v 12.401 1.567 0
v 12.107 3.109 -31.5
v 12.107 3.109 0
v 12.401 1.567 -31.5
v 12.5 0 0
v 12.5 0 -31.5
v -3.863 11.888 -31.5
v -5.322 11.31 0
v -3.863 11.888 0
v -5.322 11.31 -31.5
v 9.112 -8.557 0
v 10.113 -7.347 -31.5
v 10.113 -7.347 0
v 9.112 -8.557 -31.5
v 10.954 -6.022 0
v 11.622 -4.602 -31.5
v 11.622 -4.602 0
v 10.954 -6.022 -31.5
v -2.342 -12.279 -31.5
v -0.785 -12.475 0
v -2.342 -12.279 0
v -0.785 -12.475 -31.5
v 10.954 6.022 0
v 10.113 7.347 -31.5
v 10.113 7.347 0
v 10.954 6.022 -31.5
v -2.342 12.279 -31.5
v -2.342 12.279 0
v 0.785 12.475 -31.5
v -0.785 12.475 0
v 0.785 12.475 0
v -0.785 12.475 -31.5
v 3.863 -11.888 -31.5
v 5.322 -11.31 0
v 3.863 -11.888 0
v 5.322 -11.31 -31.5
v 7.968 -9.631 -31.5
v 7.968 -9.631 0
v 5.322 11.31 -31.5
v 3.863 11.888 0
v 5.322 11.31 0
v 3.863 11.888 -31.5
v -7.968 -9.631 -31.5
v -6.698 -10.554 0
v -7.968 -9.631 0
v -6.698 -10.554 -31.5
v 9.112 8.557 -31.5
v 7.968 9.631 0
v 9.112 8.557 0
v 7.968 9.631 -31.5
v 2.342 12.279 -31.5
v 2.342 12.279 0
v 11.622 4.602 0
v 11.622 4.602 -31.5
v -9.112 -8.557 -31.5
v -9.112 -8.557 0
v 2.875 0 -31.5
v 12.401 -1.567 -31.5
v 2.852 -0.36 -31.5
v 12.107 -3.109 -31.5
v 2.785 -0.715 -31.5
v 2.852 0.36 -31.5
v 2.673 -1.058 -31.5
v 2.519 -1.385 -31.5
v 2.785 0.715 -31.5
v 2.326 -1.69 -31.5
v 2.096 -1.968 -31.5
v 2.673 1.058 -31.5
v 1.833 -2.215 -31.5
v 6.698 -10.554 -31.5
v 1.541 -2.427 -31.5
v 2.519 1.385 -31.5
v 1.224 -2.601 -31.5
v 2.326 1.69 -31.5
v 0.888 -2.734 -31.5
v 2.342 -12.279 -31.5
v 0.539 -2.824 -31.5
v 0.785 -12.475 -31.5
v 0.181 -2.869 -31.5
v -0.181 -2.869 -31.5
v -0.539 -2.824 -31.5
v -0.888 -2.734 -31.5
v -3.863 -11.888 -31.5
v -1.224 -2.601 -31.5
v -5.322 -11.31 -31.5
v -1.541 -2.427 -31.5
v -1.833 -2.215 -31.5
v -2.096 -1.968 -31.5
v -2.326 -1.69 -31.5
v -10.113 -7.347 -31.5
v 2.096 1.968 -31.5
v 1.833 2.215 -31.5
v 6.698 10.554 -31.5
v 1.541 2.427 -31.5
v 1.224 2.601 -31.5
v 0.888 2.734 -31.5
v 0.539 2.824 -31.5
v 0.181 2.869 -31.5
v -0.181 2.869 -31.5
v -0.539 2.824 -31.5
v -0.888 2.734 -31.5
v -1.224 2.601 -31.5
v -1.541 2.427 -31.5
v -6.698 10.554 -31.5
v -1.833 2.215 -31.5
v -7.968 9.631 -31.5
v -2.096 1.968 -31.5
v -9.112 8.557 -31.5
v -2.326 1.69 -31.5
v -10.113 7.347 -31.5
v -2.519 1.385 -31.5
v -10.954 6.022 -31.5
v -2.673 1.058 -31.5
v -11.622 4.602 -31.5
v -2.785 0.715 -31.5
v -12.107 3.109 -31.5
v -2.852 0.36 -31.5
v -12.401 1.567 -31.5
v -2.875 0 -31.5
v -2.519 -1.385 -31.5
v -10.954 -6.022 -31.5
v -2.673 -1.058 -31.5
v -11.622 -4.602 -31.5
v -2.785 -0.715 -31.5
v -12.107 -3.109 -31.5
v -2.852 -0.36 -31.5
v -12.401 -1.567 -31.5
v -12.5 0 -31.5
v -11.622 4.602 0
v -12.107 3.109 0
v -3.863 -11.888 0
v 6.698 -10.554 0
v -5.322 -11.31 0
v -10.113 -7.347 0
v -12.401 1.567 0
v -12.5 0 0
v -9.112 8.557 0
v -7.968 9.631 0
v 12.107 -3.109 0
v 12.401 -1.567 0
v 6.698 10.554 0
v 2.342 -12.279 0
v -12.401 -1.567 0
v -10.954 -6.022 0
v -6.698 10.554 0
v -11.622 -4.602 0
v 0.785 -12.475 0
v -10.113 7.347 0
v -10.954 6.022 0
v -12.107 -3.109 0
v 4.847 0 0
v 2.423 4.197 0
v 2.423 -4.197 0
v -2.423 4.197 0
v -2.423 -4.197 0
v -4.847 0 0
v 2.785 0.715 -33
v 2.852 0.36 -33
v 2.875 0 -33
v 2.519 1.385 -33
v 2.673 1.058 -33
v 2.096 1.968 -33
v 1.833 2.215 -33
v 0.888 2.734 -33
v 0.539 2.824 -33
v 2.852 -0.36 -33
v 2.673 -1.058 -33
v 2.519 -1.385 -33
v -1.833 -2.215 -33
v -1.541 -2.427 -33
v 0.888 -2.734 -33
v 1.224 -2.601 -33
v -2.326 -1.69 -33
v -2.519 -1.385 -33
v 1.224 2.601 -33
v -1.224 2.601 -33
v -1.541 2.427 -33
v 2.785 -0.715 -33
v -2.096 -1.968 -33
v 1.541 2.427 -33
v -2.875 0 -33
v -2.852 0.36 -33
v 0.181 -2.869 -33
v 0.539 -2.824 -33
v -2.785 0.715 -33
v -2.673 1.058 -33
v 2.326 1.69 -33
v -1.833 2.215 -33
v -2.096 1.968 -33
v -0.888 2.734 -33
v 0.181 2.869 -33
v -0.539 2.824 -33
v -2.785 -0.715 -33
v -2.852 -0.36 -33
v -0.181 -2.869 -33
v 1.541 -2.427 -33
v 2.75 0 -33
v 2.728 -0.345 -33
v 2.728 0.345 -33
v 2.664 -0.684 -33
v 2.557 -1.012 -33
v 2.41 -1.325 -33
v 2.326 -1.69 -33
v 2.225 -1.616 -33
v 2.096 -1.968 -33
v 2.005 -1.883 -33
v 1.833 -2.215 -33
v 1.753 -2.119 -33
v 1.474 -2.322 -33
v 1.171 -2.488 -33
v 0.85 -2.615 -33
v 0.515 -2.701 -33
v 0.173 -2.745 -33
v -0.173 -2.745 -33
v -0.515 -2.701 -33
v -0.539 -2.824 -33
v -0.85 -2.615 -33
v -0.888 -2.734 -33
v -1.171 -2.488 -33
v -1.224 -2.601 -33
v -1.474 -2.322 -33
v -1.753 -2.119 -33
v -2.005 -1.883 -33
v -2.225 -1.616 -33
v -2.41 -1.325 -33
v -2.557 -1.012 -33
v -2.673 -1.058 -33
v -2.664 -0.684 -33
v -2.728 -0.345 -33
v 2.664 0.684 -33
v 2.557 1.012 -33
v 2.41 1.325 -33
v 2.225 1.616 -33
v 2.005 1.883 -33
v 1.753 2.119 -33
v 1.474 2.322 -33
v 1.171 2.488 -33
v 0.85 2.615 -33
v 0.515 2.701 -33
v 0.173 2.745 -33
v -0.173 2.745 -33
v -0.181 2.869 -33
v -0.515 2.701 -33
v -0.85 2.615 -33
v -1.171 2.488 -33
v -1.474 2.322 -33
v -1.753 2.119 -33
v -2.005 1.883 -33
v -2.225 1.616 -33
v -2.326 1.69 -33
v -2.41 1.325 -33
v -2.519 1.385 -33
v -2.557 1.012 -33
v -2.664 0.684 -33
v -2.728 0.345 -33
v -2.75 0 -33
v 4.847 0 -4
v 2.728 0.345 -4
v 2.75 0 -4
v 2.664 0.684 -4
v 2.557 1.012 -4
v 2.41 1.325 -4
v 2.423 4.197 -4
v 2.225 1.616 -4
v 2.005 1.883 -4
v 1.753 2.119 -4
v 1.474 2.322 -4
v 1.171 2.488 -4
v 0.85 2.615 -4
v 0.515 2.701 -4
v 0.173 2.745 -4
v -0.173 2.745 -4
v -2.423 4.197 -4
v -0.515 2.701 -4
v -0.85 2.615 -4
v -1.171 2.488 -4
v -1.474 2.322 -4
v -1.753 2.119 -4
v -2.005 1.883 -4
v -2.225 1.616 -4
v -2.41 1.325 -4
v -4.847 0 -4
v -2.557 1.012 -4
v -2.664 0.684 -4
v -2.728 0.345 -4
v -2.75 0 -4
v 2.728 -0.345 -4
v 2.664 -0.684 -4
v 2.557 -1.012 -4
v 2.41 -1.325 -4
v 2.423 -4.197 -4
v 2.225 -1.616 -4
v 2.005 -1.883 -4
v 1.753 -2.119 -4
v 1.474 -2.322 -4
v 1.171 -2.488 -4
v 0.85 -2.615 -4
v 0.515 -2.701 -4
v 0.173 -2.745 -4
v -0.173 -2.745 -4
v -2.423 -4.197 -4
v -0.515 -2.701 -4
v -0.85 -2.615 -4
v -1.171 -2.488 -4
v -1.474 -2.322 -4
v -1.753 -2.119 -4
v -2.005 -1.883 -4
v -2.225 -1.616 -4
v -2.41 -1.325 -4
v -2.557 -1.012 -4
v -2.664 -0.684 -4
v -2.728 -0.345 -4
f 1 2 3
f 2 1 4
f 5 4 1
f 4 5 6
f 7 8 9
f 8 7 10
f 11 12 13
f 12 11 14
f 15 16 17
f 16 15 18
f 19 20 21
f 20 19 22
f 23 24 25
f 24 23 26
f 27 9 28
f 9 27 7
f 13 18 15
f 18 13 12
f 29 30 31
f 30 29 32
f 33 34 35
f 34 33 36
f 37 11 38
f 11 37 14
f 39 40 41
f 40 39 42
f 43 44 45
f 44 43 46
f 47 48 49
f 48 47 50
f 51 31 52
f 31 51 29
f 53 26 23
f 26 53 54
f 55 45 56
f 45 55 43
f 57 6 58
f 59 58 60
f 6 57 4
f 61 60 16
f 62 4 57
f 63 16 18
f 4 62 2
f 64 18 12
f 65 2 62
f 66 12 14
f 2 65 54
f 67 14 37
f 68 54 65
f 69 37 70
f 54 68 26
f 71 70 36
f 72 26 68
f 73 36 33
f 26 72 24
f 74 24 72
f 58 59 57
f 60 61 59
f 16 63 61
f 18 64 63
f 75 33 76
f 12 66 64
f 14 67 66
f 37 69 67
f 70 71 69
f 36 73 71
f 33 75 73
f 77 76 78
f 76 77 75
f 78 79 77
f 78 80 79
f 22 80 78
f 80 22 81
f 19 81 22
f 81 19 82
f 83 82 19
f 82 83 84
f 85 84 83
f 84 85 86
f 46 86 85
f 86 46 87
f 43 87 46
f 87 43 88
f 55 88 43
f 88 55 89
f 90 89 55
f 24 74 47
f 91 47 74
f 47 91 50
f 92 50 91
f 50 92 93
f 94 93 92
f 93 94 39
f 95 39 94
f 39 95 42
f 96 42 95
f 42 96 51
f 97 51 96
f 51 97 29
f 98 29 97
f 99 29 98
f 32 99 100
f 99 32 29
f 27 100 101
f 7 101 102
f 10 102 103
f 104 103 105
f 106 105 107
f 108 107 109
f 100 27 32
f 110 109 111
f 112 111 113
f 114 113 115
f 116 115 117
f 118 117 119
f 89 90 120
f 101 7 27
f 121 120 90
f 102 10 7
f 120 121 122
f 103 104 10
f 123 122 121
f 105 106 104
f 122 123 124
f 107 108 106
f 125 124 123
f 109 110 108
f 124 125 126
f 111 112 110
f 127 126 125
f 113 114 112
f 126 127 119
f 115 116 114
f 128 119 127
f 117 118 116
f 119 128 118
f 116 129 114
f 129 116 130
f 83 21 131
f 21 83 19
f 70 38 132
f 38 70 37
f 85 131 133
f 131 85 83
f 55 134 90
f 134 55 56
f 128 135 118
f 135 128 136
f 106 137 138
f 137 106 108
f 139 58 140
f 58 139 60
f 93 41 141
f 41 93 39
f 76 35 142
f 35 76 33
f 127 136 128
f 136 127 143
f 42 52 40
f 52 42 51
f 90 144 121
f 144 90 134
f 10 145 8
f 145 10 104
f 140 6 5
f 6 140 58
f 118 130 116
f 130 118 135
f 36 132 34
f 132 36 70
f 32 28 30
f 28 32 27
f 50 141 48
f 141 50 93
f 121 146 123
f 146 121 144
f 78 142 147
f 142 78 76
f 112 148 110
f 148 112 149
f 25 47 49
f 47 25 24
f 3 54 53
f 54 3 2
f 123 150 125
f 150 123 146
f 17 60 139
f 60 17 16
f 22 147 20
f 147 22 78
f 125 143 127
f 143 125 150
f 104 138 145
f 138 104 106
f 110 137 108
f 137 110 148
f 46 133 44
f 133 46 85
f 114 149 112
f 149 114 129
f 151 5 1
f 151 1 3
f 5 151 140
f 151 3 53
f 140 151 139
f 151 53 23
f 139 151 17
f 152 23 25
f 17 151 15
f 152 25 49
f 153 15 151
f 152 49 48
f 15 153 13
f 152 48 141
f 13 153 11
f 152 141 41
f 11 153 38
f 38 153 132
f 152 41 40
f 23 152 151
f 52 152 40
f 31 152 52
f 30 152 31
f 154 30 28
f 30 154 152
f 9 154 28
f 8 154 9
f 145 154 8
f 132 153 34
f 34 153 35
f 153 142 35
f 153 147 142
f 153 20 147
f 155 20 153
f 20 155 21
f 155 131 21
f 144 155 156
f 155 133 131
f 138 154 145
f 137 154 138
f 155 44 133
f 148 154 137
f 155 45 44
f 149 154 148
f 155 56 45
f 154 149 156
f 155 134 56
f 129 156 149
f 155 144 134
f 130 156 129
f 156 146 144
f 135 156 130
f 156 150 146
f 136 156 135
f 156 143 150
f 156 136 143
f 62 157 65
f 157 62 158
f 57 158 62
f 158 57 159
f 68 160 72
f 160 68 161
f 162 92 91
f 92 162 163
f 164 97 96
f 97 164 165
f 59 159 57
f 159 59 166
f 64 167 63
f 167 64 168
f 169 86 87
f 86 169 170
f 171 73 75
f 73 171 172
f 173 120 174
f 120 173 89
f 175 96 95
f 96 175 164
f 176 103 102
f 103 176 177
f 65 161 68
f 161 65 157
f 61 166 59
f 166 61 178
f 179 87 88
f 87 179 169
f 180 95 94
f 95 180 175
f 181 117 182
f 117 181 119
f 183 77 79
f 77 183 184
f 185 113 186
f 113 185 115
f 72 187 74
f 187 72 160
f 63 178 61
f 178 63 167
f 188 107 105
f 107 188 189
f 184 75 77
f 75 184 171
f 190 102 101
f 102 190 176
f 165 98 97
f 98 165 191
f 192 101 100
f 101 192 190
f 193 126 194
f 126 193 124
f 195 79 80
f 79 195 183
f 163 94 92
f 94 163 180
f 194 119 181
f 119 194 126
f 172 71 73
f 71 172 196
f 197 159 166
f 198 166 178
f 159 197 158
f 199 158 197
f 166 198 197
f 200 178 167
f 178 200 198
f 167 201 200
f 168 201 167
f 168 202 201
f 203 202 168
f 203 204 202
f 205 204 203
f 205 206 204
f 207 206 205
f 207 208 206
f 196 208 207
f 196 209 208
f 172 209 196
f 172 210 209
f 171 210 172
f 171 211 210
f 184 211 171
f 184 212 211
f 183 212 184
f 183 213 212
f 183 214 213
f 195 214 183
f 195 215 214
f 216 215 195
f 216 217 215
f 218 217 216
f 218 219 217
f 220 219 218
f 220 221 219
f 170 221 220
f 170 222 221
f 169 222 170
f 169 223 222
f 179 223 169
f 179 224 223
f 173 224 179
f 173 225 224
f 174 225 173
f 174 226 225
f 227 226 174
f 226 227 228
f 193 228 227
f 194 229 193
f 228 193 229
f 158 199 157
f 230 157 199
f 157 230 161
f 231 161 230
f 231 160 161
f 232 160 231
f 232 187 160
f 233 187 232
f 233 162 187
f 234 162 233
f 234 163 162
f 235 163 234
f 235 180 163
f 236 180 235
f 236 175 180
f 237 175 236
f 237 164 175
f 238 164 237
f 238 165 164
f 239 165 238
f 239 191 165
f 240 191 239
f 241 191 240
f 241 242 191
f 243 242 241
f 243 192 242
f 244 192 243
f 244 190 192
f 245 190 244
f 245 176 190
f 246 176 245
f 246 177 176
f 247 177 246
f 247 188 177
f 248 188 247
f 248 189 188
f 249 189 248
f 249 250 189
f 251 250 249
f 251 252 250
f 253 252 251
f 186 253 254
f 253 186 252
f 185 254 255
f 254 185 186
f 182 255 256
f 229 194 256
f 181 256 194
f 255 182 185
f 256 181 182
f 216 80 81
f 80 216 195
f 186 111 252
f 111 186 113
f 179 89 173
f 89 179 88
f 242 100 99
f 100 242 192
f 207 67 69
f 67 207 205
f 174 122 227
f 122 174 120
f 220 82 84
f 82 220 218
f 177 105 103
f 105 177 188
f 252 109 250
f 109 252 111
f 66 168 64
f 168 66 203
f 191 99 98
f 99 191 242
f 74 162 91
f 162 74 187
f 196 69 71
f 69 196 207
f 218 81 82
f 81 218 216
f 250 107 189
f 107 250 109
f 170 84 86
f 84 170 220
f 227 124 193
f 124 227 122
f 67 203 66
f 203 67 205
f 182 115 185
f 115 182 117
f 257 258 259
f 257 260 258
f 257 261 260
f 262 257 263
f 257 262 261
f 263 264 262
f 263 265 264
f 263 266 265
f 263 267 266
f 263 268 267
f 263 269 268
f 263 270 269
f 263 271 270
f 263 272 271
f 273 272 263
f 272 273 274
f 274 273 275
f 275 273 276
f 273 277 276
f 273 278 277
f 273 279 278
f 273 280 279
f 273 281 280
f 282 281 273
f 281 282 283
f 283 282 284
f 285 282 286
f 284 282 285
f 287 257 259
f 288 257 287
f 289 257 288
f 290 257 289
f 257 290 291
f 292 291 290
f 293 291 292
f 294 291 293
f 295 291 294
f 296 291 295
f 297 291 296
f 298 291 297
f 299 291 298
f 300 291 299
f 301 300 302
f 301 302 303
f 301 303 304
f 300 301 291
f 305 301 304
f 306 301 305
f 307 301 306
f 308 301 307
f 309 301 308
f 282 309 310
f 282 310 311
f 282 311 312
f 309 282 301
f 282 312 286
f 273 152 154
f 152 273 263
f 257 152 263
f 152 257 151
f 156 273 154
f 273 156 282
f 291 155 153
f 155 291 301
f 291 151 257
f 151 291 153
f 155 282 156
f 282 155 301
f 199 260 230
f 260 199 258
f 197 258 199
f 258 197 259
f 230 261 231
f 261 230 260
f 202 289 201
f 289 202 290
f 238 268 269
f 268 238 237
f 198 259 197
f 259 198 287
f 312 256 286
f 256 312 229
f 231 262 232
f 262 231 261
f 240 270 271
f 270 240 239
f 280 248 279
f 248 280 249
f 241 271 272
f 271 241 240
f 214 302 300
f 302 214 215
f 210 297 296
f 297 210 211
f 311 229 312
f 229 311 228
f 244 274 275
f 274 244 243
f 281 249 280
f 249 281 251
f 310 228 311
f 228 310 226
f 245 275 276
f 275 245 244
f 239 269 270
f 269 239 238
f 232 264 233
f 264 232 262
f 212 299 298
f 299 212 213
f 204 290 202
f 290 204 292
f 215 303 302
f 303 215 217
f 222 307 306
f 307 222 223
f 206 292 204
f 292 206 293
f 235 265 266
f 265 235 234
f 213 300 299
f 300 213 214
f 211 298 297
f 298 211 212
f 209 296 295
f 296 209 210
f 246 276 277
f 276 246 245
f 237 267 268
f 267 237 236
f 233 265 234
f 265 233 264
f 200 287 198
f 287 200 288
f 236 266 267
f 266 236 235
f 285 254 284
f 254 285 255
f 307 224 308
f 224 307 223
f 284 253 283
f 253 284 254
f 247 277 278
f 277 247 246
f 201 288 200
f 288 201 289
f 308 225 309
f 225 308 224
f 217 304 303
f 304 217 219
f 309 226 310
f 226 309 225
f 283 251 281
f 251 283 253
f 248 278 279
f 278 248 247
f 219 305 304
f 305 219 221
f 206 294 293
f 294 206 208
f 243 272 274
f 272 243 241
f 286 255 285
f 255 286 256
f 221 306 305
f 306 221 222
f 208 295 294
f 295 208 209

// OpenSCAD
$fn = 50;

difference() {
	union() {
		translate(v = [0, 0, -31.5]) {
			cylinder(h = 31.5, r = 12.5);
		}
		#translate(v = [0, 0, -33.0]) {
			cylinder(h = 33, r = 2.875);
		}
	}
	union() {
		translate(v = [0, 0, 0]) {
			rotate(a = [0, 0, 0]) {
				difference() {
					union() {
						translate(v = [0, 0, -4]) {
							linear_extrude(height = 4) {
								polygon(points = [[4.8468, 0.0], [2.4234000000000004, 4.197451927062417], [-2.423399999999999, 4.197451927062417], [-4.8468, 5.935618106107392e-16], [-2.423400000000002, -4.197451927062416], [2.423399999999997, -4.197451927062419]]);
							}
						}
					}
					union();
				}
			}
		}
		#translate(v = [0, 0, -100.0]) {
			cylinder(h = 200, r = 2.75);
		}
	}
}
